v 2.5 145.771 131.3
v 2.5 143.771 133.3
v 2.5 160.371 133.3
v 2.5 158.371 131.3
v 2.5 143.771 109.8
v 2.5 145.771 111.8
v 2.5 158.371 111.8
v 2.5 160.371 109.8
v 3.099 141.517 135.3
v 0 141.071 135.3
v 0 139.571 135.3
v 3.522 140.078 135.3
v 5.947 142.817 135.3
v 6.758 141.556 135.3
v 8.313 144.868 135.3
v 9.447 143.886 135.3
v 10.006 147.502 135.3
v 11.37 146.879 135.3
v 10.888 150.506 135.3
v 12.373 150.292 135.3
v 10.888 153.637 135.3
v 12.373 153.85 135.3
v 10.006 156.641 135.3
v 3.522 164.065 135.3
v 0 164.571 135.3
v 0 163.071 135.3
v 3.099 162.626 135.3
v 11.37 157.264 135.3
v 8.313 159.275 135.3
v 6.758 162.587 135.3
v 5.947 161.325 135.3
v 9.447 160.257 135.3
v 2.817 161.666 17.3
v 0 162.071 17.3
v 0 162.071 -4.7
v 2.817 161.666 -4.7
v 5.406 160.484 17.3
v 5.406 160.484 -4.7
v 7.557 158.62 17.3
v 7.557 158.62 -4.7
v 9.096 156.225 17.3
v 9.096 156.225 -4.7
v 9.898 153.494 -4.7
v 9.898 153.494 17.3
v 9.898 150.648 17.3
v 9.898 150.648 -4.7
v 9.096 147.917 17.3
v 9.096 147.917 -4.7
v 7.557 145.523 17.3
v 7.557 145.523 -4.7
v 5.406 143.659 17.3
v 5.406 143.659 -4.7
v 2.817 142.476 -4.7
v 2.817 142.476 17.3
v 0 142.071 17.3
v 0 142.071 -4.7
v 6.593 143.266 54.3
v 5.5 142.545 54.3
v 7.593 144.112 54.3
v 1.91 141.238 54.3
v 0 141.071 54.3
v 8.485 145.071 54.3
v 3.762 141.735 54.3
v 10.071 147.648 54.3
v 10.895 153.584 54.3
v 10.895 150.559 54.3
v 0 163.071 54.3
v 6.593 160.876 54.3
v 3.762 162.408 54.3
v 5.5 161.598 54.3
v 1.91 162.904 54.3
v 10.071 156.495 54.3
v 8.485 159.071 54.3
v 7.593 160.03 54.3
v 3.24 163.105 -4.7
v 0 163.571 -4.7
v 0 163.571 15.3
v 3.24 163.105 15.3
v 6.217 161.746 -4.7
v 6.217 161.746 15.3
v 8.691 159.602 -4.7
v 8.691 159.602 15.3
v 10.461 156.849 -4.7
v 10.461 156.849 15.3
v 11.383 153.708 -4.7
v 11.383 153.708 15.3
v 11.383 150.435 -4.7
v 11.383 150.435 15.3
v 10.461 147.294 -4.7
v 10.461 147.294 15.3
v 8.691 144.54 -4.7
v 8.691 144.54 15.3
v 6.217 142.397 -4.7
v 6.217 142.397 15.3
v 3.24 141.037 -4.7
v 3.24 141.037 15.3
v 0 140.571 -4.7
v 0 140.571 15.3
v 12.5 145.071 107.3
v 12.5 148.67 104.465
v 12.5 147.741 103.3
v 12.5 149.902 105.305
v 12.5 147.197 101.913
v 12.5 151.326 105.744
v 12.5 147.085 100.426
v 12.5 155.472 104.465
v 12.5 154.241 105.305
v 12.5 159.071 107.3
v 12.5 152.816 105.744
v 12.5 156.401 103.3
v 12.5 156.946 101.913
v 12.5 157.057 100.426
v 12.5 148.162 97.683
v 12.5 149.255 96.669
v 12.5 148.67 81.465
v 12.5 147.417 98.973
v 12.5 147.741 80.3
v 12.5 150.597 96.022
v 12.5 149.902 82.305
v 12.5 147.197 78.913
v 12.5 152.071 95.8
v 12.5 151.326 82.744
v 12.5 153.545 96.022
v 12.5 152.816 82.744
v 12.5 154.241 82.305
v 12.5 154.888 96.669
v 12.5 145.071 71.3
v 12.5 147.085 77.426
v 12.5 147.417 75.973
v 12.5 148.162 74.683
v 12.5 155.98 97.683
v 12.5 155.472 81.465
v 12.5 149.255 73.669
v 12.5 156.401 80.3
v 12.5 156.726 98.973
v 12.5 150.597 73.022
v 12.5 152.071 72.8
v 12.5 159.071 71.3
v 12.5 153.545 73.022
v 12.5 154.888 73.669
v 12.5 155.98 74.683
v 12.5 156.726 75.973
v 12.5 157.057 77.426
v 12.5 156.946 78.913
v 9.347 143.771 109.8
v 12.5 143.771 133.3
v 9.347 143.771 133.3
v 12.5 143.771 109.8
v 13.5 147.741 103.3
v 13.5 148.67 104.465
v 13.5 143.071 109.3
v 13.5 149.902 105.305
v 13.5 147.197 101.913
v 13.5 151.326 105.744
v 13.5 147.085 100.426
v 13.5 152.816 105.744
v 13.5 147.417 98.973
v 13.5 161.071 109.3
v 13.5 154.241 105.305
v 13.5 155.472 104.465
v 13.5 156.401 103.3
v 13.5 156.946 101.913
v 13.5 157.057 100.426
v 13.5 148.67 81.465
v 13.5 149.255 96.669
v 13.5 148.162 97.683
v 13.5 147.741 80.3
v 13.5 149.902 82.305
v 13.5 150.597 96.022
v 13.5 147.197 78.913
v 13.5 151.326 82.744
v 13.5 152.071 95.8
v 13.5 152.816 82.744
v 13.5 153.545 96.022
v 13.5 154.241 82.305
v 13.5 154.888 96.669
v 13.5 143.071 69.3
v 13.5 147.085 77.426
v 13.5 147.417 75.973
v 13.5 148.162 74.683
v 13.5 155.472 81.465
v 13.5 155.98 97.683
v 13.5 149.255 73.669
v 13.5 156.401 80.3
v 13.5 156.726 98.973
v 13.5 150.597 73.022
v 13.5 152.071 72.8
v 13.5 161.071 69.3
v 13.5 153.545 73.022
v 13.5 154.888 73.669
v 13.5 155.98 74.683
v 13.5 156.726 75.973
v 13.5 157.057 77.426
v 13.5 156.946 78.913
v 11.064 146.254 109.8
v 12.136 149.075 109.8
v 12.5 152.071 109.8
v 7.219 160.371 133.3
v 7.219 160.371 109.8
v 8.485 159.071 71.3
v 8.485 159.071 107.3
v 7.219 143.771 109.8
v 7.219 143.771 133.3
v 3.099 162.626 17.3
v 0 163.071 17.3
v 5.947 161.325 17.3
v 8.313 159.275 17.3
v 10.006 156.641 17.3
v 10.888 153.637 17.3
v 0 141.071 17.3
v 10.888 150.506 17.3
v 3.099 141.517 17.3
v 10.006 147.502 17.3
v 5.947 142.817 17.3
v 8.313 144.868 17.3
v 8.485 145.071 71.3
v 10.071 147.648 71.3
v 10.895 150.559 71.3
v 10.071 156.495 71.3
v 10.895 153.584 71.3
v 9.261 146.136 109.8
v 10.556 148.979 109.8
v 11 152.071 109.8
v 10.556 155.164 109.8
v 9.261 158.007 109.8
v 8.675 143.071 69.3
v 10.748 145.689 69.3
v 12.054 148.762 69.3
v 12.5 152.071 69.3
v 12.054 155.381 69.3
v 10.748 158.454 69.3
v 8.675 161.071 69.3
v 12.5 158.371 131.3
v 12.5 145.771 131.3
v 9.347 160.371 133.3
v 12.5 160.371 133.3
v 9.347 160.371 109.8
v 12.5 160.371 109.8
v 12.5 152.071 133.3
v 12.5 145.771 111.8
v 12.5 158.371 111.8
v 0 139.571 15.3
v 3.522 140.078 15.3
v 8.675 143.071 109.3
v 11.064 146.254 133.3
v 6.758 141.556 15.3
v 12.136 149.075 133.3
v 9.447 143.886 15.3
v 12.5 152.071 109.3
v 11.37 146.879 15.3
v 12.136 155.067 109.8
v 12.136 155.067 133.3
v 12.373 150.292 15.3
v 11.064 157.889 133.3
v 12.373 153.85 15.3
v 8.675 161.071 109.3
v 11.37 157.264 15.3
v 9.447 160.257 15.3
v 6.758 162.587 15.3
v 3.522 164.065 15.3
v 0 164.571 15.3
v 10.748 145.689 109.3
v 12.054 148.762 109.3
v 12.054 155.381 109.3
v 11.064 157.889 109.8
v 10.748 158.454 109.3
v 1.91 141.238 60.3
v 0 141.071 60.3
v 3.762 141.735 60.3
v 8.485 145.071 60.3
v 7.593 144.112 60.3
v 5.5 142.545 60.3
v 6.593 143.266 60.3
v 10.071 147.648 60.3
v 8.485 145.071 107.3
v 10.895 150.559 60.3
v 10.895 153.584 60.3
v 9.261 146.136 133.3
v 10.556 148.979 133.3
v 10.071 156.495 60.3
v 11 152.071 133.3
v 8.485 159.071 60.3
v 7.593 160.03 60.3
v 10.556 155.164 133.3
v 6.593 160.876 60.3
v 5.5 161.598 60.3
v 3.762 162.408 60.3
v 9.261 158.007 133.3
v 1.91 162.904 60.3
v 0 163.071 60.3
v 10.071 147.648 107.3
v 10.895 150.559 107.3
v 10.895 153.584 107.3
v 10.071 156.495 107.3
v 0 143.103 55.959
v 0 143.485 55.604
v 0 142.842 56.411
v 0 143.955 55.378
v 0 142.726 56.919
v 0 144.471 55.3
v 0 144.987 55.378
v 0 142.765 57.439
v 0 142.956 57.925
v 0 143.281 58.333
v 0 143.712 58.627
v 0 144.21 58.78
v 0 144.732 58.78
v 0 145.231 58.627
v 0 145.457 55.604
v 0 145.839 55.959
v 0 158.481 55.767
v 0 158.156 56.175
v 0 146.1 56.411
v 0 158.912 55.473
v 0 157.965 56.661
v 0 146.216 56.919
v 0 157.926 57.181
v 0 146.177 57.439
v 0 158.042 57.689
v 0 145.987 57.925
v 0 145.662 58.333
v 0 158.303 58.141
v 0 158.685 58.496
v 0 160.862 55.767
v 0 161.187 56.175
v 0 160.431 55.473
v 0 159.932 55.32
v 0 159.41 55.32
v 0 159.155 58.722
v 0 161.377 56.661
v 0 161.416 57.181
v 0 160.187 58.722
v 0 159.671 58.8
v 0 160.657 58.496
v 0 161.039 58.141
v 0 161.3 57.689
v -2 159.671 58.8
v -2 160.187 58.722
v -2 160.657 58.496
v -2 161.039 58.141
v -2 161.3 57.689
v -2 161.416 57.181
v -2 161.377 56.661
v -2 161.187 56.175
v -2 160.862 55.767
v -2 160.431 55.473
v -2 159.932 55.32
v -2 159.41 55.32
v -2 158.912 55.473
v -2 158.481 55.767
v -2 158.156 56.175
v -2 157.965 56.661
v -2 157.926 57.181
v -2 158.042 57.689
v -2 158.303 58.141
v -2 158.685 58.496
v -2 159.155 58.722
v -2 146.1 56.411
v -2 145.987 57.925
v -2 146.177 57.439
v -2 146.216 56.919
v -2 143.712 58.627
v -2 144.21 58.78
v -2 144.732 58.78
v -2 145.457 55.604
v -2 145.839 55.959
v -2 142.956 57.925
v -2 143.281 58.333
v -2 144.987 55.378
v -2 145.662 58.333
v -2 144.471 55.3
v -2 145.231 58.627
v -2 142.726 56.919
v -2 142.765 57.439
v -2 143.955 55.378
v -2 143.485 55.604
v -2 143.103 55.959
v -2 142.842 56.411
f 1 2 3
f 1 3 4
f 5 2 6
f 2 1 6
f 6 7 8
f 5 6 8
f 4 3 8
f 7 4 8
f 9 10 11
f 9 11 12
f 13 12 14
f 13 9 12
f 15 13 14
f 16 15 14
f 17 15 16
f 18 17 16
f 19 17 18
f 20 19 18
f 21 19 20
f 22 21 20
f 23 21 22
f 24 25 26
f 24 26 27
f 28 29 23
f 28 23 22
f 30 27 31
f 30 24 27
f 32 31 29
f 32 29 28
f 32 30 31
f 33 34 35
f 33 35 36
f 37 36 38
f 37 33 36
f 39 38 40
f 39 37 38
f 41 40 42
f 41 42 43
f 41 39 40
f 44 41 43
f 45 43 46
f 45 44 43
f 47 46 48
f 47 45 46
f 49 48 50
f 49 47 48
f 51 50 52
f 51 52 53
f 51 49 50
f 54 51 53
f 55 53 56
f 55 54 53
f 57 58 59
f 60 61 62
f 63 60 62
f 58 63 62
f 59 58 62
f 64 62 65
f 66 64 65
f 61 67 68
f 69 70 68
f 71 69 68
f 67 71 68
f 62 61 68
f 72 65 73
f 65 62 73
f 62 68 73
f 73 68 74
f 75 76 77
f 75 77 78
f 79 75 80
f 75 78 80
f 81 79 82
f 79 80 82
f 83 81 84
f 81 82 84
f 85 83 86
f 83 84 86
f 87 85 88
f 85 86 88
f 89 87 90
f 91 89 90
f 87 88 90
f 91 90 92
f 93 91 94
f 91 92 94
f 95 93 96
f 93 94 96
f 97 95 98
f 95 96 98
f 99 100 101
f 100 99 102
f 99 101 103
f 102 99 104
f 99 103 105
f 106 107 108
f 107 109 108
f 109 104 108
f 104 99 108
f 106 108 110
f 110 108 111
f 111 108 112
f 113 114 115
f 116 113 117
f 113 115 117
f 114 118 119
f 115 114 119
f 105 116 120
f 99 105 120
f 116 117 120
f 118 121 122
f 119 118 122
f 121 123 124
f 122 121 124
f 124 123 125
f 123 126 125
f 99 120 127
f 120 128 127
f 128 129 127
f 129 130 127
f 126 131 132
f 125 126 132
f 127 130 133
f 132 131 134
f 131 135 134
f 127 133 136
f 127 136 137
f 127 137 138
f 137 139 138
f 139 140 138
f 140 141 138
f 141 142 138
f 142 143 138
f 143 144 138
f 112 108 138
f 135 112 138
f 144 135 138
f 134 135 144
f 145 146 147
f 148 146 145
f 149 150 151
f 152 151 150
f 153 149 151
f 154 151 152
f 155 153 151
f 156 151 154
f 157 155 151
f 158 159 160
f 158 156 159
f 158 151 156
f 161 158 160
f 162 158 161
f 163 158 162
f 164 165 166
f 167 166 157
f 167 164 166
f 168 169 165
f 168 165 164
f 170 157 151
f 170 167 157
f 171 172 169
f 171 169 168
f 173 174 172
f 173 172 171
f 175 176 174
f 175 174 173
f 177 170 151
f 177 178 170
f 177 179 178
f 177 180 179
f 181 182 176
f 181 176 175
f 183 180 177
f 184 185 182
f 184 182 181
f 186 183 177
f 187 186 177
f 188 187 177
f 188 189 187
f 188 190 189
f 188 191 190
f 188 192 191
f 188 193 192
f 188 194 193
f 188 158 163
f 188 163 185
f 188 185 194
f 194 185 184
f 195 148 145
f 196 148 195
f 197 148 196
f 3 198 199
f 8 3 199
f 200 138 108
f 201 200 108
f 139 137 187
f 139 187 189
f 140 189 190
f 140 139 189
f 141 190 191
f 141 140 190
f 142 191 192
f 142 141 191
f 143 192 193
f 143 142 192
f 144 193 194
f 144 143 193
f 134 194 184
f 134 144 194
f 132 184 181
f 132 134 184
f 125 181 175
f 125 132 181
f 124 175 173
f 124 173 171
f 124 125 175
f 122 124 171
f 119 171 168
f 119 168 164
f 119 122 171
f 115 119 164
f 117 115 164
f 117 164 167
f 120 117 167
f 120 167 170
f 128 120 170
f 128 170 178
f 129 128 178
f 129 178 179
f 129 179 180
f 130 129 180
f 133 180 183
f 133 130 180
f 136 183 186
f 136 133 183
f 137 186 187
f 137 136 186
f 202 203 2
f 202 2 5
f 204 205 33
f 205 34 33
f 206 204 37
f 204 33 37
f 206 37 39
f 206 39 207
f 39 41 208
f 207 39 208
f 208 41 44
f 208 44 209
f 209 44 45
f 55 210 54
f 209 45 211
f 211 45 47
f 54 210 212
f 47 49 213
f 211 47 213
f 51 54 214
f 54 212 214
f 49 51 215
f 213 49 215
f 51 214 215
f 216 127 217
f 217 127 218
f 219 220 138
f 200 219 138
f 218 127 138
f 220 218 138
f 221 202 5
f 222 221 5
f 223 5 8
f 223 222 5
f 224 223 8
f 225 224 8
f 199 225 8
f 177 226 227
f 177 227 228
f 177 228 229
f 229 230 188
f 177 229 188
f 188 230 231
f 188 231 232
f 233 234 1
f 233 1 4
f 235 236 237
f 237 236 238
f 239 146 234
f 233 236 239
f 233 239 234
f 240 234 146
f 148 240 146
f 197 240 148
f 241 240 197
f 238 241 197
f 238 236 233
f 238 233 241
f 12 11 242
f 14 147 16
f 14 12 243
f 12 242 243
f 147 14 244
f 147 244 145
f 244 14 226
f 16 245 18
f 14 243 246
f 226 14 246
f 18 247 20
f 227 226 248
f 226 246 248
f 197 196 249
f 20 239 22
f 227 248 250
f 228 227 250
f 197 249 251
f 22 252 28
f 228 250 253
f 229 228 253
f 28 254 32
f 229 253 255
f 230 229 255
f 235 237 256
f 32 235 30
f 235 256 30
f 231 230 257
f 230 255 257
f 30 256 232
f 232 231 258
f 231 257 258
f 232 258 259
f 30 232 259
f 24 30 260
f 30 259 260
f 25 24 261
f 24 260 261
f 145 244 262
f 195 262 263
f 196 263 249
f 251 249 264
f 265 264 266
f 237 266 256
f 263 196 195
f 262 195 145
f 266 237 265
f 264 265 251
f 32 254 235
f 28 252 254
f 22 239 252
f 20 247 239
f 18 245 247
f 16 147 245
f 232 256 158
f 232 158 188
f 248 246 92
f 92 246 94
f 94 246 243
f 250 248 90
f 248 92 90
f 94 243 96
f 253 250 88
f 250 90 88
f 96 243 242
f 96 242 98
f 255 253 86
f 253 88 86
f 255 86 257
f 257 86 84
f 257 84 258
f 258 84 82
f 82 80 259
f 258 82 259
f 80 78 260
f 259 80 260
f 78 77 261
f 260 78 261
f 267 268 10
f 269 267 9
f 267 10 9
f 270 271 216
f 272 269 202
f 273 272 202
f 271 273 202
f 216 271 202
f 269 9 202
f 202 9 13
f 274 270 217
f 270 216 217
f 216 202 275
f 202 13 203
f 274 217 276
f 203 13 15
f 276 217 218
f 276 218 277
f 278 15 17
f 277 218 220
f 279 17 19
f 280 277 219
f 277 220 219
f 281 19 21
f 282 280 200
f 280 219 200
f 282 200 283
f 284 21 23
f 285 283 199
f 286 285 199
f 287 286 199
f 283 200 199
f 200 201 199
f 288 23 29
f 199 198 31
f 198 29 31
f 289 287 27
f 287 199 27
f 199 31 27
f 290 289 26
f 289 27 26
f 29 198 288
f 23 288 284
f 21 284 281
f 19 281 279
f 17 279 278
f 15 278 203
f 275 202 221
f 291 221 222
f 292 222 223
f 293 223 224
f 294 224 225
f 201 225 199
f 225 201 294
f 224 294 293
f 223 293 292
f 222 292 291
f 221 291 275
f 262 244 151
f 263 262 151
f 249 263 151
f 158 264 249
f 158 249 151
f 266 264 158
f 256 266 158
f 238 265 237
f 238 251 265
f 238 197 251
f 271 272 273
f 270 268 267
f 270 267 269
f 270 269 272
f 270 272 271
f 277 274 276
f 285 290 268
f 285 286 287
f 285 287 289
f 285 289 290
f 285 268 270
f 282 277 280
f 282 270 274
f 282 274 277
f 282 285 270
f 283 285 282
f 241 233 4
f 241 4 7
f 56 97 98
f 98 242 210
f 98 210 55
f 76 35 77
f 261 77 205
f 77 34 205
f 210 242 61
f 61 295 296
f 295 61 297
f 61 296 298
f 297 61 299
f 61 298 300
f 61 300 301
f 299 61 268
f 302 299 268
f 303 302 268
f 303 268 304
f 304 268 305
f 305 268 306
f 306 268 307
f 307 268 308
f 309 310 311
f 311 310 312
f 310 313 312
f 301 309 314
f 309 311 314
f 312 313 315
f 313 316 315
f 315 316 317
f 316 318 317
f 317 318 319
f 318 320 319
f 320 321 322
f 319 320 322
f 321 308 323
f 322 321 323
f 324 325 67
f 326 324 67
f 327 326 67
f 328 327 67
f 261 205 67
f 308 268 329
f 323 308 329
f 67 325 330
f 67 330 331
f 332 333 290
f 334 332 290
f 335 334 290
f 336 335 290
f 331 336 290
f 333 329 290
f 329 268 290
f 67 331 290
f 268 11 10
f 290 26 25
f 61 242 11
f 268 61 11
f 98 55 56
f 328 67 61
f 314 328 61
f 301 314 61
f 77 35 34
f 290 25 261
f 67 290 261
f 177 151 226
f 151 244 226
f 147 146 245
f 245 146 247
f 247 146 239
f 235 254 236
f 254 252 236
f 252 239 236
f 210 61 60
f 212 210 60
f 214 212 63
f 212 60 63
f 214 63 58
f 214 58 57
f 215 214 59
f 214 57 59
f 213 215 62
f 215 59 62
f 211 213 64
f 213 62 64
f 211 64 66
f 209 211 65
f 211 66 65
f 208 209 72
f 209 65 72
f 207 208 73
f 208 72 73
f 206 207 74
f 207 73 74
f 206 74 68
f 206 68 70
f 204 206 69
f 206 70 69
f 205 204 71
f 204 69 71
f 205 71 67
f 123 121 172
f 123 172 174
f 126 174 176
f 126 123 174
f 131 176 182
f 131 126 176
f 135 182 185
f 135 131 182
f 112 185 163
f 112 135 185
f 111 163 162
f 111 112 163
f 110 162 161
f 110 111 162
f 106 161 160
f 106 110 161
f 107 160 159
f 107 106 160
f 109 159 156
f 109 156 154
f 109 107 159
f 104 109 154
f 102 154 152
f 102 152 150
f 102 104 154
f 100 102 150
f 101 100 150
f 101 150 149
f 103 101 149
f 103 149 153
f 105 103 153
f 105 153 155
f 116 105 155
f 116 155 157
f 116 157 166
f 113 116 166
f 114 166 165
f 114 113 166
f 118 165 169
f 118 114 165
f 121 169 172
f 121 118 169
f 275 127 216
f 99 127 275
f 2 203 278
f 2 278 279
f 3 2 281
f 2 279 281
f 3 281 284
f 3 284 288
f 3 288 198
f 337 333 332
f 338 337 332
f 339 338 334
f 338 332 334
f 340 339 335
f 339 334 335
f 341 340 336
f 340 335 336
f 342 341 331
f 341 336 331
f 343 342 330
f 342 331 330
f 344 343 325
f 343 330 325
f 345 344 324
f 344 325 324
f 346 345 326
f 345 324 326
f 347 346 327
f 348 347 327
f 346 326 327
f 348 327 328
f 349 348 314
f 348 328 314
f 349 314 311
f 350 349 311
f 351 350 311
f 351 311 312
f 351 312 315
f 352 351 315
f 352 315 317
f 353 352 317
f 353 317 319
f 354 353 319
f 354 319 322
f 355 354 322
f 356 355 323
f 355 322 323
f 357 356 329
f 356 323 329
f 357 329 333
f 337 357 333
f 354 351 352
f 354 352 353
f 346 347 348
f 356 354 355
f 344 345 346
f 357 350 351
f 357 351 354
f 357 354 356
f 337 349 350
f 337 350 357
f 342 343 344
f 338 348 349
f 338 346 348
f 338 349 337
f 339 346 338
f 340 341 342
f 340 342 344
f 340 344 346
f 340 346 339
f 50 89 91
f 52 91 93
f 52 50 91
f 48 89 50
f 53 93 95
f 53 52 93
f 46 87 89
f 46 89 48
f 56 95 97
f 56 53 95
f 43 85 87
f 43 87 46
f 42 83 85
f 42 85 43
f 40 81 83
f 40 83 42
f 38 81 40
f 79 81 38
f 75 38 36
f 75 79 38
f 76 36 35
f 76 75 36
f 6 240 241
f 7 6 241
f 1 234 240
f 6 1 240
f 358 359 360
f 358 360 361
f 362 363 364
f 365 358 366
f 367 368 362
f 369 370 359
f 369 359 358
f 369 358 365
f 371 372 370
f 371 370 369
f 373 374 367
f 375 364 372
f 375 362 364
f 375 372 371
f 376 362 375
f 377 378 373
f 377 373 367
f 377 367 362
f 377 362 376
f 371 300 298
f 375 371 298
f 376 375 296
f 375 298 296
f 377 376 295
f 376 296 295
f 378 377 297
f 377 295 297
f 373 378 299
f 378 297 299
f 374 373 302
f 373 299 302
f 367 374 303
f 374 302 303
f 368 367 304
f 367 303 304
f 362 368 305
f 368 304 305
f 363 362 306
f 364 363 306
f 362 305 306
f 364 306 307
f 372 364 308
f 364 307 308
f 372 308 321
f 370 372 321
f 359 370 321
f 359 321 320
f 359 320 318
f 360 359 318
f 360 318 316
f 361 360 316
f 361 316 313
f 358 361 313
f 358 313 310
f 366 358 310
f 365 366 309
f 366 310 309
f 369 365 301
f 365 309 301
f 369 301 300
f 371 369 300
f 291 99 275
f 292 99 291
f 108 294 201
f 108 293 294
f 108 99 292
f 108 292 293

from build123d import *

# Parameters (mm, degrees)
SKETCH1_W                = 15.3
SKETCH1_H                = 180
SKETCH1_W_2              = 12.3
SKETCH1_H_2              = 20
BOSS_EXTRUDE1_DEPTH      = 120
BOSS_EXTRUDE1_DEPTH_BACK = 9
SKETCH4_R                = 12.5
BOSS_EXTRUDE2_START      = -25
SKETCH6_W                = 40
SKETCH6_H                = 18
SKETCH6_W_2              = 36
SKETCH6_H_2              = 14
BOSS_EXTRUDE2_DEPTH      = 10
SKETCH2_R                = 10.8
CUT_EXTRUDE1_DEPTH       = 199
SKETCH5_R                = 11
CUT_EXTRUDE2_DEPTH       = 133
SKETCH7_W                = 36
SKETCH7_H                = 14
CUT_EXTRUDE3_DEPTH       = 15
BOSS_EXTRUDE3_START      = -11
SKETCH8_W                = 5.5
SKETCH8_H                = 22
BOSS_EXTRUDE3_DEPTH      = 6
SKETCH10_W               = 23.5
SKETCH10_H               = 16.6
SKETCH10_W_2             = 19.5
SKETCH10_H_2             = 12.6
BOSS_EXTRUDE5_DEPTH      = 10
SKETCH11_W               = 19.5
SKETCH11_H               = 12.6
CUT_EXTRUDE4_DEPTH       = 12
SKETCH13_W               = 40
SKETCH13_H               = 18
SKETCH13_R               = 5
BOSS_EXTRUDE6_DEPTH      = 1
CUT_EXTRUDE7_DEPTH       = 106
CUT_EXTRUDE7_DEPTH_BACK  = 39
SKETCH15_W               = 30.6
SKETCH15_H               = 203.669908639
SKETCH16_R               = 12.5
BOSS_EXTRUDE7_DEPTH      = 2
SKETCH17_R               = 11.5
SKETCH17_R_2             = 10
BOSS_EXTRUDE8_DEPTH      = 20
CUT_EXTRUDE8_START       = -2
SKETCH18_R               = 10
CUT_EXTRUDE8_DEPTH       = 2
SKETCH9_R                = 1.75
BOSS_EXTRUDE4_DEPTH      = 2
CUT_EXTRUDE10_DEPTH      = 182


with BuildPart() as part:
    # Sketch1 → Revolve1 (revolve)
    with BuildSketch(Plane.XY, mode=Mode.PRIVATE) as revolve1_sk:
        with Locations((-7.65, 90)):
            Rectangle(SKETCH1_W, SKETCH1_H)
        with Locations((-6.15, -10)):
            Rectangle(SKETCH1_W_2, SKETCH1_H_2)
    revolve(revolve1_sk.sketch.rotate(Axis((0, 259.808396335, 0), (0, -1, 0)), 270), axis=Axis((0, 259.808396335, 0), (0, -1, 0)))

    # Sketch4 → Boss-Extrude1 (add, two sides: drawn at the far end of the back side and taken through both)
    with BuildSketch(Plane.XY.offset(15.3).offset(-BOSS_EXTRUDE1_DEPTH_BACK)):
        with Locations((0, 152.071263422)):
            Circle(SKETCH4_R)
    extrude(amount=BOSS_EXTRUDE1_DEPTH + BOSS_EXTRUDE1_DEPTH_BACK)

    # Sketch6 → Boss-Extrude2 (add)
    with BuildSketch(Plane.ZY.offset(12.5).offset(BOSS_EXTRUDE2_START)):
        with Locations((89.3, 152.071263422)):
            Rectangle(SKETCH6_W, SKETCH6_H)
        with Locations((89.3, 152.071263422)):
            Rectangle(SKETCH6_W_2, SKETCH6_H_2, mode=Mode.SUBTRACT)
    extrude(amount=BOSS_EXTRUDE2_DEPTH)

    # Sketch2 → Cut-Extrude1 (cut)
    with BuildSketch(Plane.XZ.offset(20)):
        with Locations(Location((0, 0, 0), (0, 0, 270))):
            Circle(SKETCH2_R)
    extrude(amount=-CUT_EXTRUDE1_DEPTH, mode=Mode.SUBTRACT)

    # Sketch5 → Cut-Extrude2 (cut)
    with BuildSketch(Plane.XY.offset(135.3)):
        with Locations((0, 152.071263422)):
            Circle(SKETCH5_R)
    extrude(amount=-CUT_EXTRUDE2_DEPTH, mode=Mode.SUBTRACT)

    # Sketch7 → Cut-Extrude3 (cut)
    with BuildSketch(Plane(origin=(12.5, 0, 0), x_dir=(0, 0, -1), z_dir=(1, 0, 0))):
        with Locations((-89.3, 152.071263422)):
            Rectangle(SKETCH7_W, SKETCH7_H)
    extrude(amount=-CUT_EXTRUDE3_DEPTH, mode=Mode.SUBTRACT)

    # Sketch8 → Boss-Extrude3 (add)
    with BuildSketch(Plane.XY.offset(71.3).offset(BOSS_EXTRUDE3_START)):
        with Locations((2.75, 152.071263422)):
            Rectangle(SKETCH8_W, SKETCH8_H)
        with BuildLine():
            ThreePointArc((8.485281374, 159.071263422), (7.105810702, 160.468135117), (5.5, 161.597542863))
            Line((5.5, 161.597542863), (5.5, 142.54498398))
            ThreePointArc((5.5, 142.54498398), (7.105810702, 143.674391726), (8.485281374, 145.071263422))
            ThreePointArc((8.485281374, 145.071263422), (11, 152.071263422), (8.485281374, 159.071263422))
        make_face()
    extrude(amount=-BOSS_EXTRUDE3_DEPTH)

    # Sketch10 → Boss-Extrude5 (add)
    with BuildSketch(Plane(origin=(12.5, 0, 0), x_dir=(0, 0, -1), z_dir=(1, 0, 0))):
        with Locations((-121.55, 152.071263422)):
            Rectangle(SKETCH10_W, SKETCH10_H)
        with Locations((-121.55, 152.071263422)):
            Rectangle(SKETCH10_W_2, SKETCH10_H_2, mode=Mode.SUBTRACT)
    extrude(amount=-BOSS_EXTRUDE5_DEPTH)

    # Sketch11 → Cut-Extrude4 (cut)
    with BuildSketch(Plane(origin=(12.5, 0, 0), x_dir=(0, 0, -1), z_dir=(1, 0, 0))):
        with Locations((-121.55, 152.071263422)):
            Rectangle(SKETCH11_W, SKETCH11_H)
    extrude(amount=-CUT_EXTRUDE4_DEPTH, mode=Mode.SUBTRACT)

    # Sketch13 → Boss-Extrude6 (add)
    with BuildSketch(Plane(origin=(12.5, 0, 0), x_dir=(0, 0, -1), z_dir=(1, 0, 0))):
        with Locations((-89.3, 152.071263422)):
            Rectangle(SKETCH13_W, SKETCH13_H)
        with Locations((-100.8, 152.071263422)):
            Circle(SKETCH13_R, mode=Mode.SUBTRACT)
        with Locations((-77.8, 152.071263422)):
            Circle(SKETCH13_R, mode=Mode.SUBTRACT)
    extrude(amount=BOSS_EXTRUDE6_DEPTH)

    # Sketch15 → Cut-Extrude7 (cut, two sides: drawn at the far end of the back side and taken through both)
    with BuildSketch(Plane(origin=(0, 0, 0), x_dir=(0, 0, -1), z_dir=(1, 0, 0)).offset(-CUT_EXTRUDE7_DEPTH_BACK)):
        with Locations((0, 78.165045681)):
            Rectangle(SKETCH15_W, SKETCH15_H)
    extrude(amount=CUT_EXTRUDE7_DEPTH + CUT_EXTRUDE7_DEPTH_BACK, mode=Mode.SUBTRACT)

    # Sketch16 → Boss-Extrude7 (add)
    with BuildSketch(Plane(origin=(0, 0, 15.3), x_dir=(-1, 0, 0), z_dir=(0, 0, -1))):
        with Locations(Location((0, 152.071263422, 0), (0, 0, 180))):
            Circle(SKETCH16_R)
    extrude(amount=-BOSS_EXTRUDE7_DEPTH)

    # Sketch17 → Boss-Extrude8 (add)
    with BuildSketch(Plane(origin=(0, 0, 15.3), x_dir=(-1, 0, 0), z_dir=(0, 0, -1))):
        with Locations((0, 152.071263422)):
            Circle(SKETCH17_R)
        with Locations((0, 152.071263422)):
            Circle(SKETCH17_R_2, mode=Mode.SUBTRACT)
    extrude(amount=BOSS_EXTRUDE8_DEPTH)

    # Sketch18 → Cut-Extrude8 (cut)
    with BuildSketch(Plane(origin=(0, 0, 15.3), x_dir=(-1, 0, 0), z_dir=(0, 0, -1)).offset(CUT_EXTRUDE8_START)):
        with Locations((0, 152.071263422)):
            Circle(SKETCH18_R)
    extrude(amount=CUT_EXTRUDE8_DEPTH, mode=Mode.SUBTRACT)

    # Sketch9 → Boss-Extrude4 (add)
    with BuildSketch(Plane.ZY):
        with Locations((57.05, 159.671263422)):
            Circle(SKETCH9_R)
        with Locations(Location((57.05, 144.471263422, 0), (0, 0, 180))):
            Circle(SKETCH9_R)
    extrude(amount=BOSS_EXTRUDE4_DEPTH)

    # Sketch19 → Cut-Extrude10 (cut)
    with BuildSketch(Plane.XY.offset(135.3)):
        with BuildLine():
            ThreePointArc((0, 141.071263422), (-11, 152.071263422), (0, 163.071263422))
            Line((0, 163.071263422), (0, 164.571263422))
            ThreePointArc((0, 164.571263422), (-12.5, 152.071263422), (0, 139.571263422))
            Line((0, 139.571263422), (0, 141.071263422))
        make_face()
        with BuildLine():
            Line((-2.177257281, 161.7010227), (0, 161.7010227))
            Line((0, 161.7010227), (0, 163.071263422))
            ThreePointArc((0, 163.071263422), (-11, 152.071263422), (0, 141.071263422))
            Line((0, 141.071263422), (0, 142.542341384))
            Line((0, 142.542341384), (-2.177257281, 142.542341384))
            Line((-2.177257281, 142.542341384), (-2.177257281, 143.338591967))
            ThreePointArc((-2.177257281, 143.338591967), (-9, 152.071263422), (-2.177257281, 160.803934876))
            Line((-2.177257281, 160.803934876), (-2.177257281, 161.7010227))
        make_face()
        with BuildLine():
            Line((-2.177257281, 143.338591967), (-2.177257281, 160.803934876))
            ThreePointArc((-2.177257281, 160.803934876), (-9, 152.071263422), (-2.177257281, 143.338591967))
        make_face()
    extrude(amount=-CUT_EXTRUDE10_DEPTH, mode=Mode.SUBTRACT)


solid = part.part
